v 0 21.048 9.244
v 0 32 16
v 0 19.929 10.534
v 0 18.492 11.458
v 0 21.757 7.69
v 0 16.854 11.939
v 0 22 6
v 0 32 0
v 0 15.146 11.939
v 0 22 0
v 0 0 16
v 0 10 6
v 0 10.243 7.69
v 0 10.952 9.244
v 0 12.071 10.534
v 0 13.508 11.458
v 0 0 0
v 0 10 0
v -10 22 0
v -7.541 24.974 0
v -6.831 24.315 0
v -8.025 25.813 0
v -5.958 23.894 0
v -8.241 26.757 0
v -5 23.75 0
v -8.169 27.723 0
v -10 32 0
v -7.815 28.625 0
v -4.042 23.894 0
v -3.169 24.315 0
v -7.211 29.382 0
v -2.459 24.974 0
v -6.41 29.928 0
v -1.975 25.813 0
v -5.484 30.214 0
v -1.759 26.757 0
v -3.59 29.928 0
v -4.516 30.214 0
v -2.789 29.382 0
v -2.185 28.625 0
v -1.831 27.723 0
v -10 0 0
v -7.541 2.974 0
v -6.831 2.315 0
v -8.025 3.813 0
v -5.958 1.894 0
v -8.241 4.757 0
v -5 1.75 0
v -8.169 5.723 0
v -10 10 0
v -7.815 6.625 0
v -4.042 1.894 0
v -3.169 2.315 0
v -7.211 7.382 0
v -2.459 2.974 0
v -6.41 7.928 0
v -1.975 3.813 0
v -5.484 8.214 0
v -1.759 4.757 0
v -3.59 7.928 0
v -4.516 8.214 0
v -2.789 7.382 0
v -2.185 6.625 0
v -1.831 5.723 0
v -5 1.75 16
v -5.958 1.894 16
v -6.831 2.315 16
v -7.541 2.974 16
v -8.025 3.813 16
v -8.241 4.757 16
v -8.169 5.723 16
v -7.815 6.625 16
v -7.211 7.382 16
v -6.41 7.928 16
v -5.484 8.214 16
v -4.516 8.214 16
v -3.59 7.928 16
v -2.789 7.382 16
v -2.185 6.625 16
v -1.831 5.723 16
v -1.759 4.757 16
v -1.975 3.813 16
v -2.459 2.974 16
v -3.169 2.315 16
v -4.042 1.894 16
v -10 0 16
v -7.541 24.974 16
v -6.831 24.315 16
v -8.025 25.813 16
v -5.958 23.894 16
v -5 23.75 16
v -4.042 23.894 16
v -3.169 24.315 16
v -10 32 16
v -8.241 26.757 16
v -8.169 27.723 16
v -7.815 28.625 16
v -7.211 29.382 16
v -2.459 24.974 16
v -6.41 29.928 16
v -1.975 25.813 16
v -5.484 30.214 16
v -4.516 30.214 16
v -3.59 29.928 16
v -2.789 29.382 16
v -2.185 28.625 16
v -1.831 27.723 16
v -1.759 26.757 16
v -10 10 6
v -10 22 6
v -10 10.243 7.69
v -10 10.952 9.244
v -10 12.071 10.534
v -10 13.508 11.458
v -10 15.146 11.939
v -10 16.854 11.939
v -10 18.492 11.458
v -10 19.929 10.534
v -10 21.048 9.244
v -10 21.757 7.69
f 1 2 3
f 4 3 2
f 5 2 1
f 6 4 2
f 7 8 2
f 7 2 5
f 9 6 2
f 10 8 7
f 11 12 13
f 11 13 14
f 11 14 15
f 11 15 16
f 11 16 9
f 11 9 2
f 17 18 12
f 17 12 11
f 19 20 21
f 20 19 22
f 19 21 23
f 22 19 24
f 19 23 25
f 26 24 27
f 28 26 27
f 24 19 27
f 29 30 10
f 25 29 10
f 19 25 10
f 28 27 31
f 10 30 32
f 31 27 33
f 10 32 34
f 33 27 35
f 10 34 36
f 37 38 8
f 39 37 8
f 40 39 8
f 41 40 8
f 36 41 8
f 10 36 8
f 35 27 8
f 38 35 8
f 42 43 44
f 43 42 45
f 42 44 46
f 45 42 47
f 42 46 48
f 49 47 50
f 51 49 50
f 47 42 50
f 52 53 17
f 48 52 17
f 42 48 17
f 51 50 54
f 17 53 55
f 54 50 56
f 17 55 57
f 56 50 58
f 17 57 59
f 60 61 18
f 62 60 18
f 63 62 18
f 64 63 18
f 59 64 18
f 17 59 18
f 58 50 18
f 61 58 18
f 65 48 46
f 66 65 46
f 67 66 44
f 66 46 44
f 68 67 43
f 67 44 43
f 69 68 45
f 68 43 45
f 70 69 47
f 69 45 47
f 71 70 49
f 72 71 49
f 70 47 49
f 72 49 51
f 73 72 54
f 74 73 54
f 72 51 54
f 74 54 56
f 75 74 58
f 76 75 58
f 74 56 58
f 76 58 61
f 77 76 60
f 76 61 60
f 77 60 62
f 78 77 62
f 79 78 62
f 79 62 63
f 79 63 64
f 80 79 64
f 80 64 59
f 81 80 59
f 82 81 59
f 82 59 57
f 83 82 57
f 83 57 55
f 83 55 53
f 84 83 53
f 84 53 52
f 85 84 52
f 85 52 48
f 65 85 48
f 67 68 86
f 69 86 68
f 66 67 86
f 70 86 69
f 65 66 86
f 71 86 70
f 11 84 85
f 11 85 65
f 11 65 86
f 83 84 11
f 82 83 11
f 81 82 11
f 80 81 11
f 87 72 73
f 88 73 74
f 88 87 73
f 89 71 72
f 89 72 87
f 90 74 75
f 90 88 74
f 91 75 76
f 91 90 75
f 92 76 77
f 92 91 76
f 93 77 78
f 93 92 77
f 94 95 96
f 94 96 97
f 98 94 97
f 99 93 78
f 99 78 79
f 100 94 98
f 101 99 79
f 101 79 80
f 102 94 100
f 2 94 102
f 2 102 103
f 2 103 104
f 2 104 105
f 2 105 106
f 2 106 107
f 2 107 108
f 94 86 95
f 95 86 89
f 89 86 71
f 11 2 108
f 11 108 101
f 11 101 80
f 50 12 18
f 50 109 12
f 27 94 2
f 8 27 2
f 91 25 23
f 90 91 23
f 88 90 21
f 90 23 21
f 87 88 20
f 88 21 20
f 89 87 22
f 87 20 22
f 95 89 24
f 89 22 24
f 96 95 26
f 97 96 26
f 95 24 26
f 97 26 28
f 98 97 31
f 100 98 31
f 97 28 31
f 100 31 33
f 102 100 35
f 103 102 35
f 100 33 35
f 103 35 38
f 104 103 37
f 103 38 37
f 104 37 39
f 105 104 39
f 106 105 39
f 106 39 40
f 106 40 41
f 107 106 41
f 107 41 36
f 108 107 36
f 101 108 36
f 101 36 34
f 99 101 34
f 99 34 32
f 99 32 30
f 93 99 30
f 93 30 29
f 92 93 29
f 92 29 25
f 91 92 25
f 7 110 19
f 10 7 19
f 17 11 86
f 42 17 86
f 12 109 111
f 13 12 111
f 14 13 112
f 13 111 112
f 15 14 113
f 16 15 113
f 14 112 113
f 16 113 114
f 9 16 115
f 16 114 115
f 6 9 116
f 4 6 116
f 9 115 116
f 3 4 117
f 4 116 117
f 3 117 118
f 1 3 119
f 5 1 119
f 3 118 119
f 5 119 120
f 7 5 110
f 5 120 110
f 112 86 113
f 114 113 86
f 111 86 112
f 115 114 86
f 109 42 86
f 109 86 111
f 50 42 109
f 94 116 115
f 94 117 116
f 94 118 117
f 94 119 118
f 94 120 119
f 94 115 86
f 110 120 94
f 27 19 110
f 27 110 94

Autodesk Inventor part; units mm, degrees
ref_plane "YZ Plane" through (0, 0, 0) normal (1, 0, 0) x (0, 1, 0)
ref_plane "XZ Plane" through (0, 0, 0) normal (0, 1, 0) x (-1, 0, 0)
ref_plane "XY Plane" through (0, 0, 0) normal (0, 0, 1) x (1, 0, 0)
ref_plane "Work Plane1" through (170, -244, 0) normal (0, 0, 1) x (1, 0, 0)
sketch "Sketch1" plane through (170, -244, 0) normal (0, 0, 1) x (1, 0, 0)
  line L0 (-170, 244) -> (-180, 244)
  line L1 (-180, 244) -> (-180, 276)
  line L2 (-180, 276) -> (-170, 276)
  line L3 (-170, 276) -> (-170, 244)
  dimension "d0" = 10
  dimension "d1" = 32
extrude "Extrusion1" add sketch "Sketch1" along normal blind 16
sketch "Sketch2" plane through (-10, 0, 0) normal (-1, 0, 0) x (0, 0, 1)
  arc A0 (6, 10) -> (6, 22) centre (6, 16) ccw
  line L0 (0, 32) -> (16, 32) projected
  line L1 (0, 38.4) -> (0, -6.4) projected
  line L2 (6, 10) -> (0, 10)
  line L3 (0, 32) -> (0, 0) projected
  line L4 (6, 22) -> (0, 22)
  line L5 (0, 10) -> (0, 22)
  dimension "d4" = 12
  dimension "d5" = 16
  dimension "d6" = 6
extrude "Extrusion2" cut sketch "Sketch2" against normal blind 16
sketch "Sketch3" plane through (170, -244, 16) normal (0, 0, 1) x (1, 0, 0)
  line L0 (-170, 244) -> (-170, 276) projected
  line L1 (-170, 276) -> (-180, 276) projected
  line L2 (-180, 244) -> (-170, 244) projected
  point P0 (-175, 249)
  point P1 (-175, 271)
  dimension "d9" = 5
  dimension "d10" = 5
  dimension "d11" = 5
  dimension "d12" = 5
hole "Hole1" at (-5, 5, 16) at (-5, 27, 16) direction (0, 0, -1) diameter 6.5 end through all
properties part number "U_OS"
